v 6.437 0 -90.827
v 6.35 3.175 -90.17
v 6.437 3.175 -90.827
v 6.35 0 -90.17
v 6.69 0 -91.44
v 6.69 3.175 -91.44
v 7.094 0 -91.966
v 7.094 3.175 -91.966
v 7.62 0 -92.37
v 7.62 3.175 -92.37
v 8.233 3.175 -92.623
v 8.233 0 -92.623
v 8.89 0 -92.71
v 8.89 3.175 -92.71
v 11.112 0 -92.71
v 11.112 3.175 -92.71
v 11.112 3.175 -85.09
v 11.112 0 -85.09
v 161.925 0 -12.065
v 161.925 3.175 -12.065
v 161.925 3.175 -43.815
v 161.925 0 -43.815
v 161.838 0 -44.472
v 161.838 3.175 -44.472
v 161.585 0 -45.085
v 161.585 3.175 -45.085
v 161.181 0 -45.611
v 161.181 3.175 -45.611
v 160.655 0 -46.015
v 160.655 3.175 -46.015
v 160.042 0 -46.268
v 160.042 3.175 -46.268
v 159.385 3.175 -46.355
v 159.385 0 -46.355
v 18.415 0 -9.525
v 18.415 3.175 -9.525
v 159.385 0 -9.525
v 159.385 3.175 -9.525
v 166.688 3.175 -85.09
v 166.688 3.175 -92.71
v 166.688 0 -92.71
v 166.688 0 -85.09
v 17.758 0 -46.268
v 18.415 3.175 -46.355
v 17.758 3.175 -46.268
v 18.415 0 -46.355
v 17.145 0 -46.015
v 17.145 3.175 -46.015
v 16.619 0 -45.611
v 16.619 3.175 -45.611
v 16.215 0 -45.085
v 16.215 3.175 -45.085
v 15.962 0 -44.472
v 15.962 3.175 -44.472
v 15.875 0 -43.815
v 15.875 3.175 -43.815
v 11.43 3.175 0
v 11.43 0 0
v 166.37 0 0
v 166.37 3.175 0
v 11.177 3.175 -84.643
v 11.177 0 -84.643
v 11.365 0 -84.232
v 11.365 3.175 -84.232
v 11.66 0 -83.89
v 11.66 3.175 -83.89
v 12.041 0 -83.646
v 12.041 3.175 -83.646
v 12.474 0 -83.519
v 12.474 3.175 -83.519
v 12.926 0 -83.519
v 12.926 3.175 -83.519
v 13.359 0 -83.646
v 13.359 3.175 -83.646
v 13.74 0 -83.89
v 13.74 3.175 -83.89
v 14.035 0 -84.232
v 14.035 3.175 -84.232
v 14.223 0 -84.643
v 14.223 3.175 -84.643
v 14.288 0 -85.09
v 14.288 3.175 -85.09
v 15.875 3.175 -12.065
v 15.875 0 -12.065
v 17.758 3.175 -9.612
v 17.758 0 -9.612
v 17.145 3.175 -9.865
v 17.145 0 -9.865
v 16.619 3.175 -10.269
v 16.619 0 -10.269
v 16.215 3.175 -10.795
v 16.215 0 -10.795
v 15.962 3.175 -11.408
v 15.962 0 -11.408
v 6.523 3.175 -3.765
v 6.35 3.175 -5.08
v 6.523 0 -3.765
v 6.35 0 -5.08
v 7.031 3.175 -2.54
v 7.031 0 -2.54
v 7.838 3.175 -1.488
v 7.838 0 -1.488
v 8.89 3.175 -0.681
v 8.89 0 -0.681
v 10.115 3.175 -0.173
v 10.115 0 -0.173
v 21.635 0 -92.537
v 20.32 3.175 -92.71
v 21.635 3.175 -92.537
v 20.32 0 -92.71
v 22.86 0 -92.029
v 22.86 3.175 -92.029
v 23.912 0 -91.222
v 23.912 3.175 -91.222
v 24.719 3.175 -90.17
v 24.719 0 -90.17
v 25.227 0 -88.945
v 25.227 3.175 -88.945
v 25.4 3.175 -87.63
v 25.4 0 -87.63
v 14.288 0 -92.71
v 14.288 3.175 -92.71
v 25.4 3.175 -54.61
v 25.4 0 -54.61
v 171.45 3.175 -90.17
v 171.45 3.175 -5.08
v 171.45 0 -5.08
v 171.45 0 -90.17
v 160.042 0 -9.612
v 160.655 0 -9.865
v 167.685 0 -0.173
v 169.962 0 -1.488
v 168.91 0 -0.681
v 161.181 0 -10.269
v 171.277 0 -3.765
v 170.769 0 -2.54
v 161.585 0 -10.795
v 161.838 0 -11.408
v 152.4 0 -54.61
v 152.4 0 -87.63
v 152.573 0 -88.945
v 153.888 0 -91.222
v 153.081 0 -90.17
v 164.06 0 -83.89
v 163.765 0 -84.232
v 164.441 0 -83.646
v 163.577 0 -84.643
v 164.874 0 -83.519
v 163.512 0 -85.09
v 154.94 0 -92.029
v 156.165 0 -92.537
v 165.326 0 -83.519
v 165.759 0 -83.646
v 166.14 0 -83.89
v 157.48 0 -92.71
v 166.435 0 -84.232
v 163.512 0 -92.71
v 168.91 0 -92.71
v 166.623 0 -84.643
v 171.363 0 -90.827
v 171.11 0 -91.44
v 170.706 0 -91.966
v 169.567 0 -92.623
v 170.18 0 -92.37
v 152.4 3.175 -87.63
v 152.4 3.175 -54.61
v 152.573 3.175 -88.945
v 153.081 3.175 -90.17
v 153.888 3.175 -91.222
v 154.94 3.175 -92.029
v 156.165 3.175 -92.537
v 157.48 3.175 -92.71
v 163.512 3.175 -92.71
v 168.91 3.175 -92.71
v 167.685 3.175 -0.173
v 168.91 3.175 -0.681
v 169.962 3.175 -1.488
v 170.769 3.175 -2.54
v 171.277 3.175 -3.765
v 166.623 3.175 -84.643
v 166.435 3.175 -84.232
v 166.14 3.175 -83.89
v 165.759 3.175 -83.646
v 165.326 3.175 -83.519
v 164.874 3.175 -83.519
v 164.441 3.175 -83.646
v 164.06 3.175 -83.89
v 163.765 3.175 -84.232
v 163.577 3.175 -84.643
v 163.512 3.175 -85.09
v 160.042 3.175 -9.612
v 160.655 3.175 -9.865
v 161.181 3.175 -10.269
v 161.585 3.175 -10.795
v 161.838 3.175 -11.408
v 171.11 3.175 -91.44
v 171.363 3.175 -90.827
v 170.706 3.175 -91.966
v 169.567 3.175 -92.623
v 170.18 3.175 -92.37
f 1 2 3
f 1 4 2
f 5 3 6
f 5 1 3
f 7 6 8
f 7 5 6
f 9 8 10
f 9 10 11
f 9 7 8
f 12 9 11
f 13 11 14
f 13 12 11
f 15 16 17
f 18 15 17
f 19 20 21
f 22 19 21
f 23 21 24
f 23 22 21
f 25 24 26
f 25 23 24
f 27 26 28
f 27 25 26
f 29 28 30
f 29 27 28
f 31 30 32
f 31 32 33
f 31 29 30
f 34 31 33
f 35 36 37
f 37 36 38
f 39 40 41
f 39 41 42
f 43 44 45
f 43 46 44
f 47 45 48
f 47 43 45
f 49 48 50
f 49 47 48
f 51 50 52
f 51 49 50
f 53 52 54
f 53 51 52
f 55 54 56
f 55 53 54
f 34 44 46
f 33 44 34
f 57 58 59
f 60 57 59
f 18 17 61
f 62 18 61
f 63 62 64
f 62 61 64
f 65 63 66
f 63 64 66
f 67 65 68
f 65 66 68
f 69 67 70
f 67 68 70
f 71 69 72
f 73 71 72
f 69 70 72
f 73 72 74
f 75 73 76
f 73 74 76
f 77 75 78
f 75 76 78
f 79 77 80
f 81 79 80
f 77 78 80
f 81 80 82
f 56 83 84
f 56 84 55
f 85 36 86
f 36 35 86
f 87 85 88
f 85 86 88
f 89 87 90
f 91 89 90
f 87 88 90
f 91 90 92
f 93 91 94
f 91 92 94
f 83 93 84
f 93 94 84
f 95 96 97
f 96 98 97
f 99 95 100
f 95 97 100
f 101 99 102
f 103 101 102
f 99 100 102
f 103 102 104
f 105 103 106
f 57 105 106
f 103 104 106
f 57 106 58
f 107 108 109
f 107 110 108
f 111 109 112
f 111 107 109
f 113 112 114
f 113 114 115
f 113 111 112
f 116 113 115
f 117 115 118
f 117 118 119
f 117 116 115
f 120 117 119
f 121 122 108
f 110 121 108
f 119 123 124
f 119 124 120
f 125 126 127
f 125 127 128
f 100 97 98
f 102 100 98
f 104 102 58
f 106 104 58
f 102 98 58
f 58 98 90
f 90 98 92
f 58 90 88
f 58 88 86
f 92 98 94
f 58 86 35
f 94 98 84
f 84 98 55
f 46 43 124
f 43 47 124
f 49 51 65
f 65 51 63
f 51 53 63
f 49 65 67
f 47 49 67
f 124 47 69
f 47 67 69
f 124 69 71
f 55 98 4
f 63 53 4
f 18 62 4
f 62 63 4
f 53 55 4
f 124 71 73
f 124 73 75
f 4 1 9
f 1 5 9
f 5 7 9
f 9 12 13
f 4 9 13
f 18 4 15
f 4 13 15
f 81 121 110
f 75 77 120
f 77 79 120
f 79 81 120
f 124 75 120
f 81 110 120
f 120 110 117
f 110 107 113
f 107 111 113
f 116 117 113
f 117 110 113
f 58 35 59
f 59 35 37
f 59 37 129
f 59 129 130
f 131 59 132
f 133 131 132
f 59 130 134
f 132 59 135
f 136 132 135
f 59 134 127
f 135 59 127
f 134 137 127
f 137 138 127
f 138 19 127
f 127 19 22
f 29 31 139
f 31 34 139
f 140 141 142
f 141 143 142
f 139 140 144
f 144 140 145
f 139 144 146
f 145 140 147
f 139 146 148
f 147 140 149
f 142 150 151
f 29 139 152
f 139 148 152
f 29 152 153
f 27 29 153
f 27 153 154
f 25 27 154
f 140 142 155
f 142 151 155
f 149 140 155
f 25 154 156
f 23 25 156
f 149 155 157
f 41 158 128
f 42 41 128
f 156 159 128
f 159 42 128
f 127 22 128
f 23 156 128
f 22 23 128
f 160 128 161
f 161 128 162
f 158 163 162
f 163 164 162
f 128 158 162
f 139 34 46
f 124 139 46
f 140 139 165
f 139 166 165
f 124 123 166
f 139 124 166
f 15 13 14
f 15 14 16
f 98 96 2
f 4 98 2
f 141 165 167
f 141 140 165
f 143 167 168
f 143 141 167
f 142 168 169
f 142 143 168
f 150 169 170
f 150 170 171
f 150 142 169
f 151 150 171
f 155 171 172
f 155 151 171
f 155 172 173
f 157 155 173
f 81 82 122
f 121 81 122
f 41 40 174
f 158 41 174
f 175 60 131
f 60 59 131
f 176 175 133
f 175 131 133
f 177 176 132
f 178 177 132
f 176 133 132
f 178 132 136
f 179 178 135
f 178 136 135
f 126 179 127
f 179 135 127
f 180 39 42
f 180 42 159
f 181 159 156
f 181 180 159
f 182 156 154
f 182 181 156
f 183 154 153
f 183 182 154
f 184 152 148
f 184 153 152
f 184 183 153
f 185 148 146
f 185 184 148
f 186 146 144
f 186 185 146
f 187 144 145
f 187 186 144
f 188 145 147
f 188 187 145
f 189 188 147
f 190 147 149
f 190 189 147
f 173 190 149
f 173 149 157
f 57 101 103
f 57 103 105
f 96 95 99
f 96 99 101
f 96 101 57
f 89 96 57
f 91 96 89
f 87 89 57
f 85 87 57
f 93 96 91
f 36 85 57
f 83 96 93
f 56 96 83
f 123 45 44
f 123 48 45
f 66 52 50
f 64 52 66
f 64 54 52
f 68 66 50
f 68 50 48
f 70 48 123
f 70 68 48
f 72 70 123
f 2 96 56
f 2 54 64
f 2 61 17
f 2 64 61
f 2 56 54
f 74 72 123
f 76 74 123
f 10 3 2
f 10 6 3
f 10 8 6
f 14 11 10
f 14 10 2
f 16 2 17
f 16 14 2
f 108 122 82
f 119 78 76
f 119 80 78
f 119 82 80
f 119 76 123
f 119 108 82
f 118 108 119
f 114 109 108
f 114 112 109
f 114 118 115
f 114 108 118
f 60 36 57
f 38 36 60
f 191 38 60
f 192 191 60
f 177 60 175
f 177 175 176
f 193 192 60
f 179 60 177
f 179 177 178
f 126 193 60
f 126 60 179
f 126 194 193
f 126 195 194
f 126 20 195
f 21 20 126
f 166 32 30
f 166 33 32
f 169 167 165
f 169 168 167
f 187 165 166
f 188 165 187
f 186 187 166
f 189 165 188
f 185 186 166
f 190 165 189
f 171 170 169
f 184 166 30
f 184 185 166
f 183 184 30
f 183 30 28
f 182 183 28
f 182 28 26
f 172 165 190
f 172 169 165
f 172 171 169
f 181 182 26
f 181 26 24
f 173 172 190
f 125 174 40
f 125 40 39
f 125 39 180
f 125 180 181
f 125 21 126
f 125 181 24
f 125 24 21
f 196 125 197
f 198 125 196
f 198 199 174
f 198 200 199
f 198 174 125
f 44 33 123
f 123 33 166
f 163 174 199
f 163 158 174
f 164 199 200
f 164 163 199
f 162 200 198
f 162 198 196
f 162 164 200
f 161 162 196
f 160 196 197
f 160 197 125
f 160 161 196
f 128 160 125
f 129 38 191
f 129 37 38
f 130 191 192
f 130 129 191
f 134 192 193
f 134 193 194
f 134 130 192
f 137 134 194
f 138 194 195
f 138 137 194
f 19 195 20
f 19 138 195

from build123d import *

# Parameters (mm, degrees)
SKETCH1_W           = 177.8
SKETCH1_H           = 67.31
BOSS_EXTRUDE1_DEPTH = 3.175
CUT_EXTRUDE2_DEPTH  = 4.175
SKETCH5_W           = 127
SKETCH5_H           = 12.7
CUT_EXTRUDE3_DEPTH  = 4.175
SKETCH7_W           = 25.4
SKETCH7_H           = 38.1
BOSS_EXTRUDE2_DEPTH = 3.175
CUT_EXTRUDE4_DEPTH  = 4.175
FILLET3_R           = 5.08
SKETCH9_W           = 6.35
SKETCH9_H           = 92.71
CUT_EXTRUDE5_DEPTH  = 4.175
FILLET4_R           = 2.54
FILLET5_R           = 5.08
SKETCH10_W          = 146.05
SKETCH10_H          = 36.83
CUT_EXTRUDE6_DEPTH  = 4.175
FILLET6_R           = 2.54


with BuildPart() as part:
    # Sketch1 → Boss-Extrude1 (new body)
    with BuildSketch(Plane(origin=(0, 0, 0), x_dir=(1, 0, 0), z_dir=(0, 1, 0))):
        with Locations((88.9, 33.655)):
            Rectangle(SKETCH1_W, SKETCH1_H)
    extrude(amount=BOSS_EXTRUDE1_DEPTH)

    # Sketch4 → Cut-Extrude2 (cut, through all)
    with BuildSketch(Plane(origin=(0, 3.175, 0), x_dir=(1, 0, 0), z_dir=(0, 1, 0))):
        with BuildLine():
            Line((11.1125, 67.31), (11.1125, 62.23))
            ThreePointArc((11.1125, 62.23), (12.7, 60.6425), (14.2875, 62.23))
            Line((14.2875, 62.23), (14.2875, 67.31))
            Line((14.2875, 67.31), (11.1125, 67.31))
        make_face()
        with BuildLine():
            Line((166.6875, 67.31), (166.6875, 62.23))
            ThreePointArc((166.6875, 62.23), (165.1, 60.6425), (163.5125, 62.23))
            Line((163.5125, 62.23), (163.5125, 67.31))
            Line((163.5125, 67.31), (166.6875, 67.31))
        make_face()
    extrude(amount=-CUT_EXTRUDE2_DEPTH, mode=Mode.SUBTRACT)

    # Sketch5 → Cut-Extrude3 (cut, through all)
    with BuildSketch(Plane(origin=(0, 3.175, 0), x_dir=(1, 0, 0), z_dir=(0, 1, 0))):
        with Locations((88.9, 60.96)):
            Rectangle(SKETCH5_W, SKETCH5_H)
    extrude(amount=-CUT_EXTRUDE3_DEPTH, mode=Mode.SUBTRACT)

    # Sketch7 → Boss-Extrude2 (add)
    with BuildSketch(Plane(origin=(0, 3.175, 0), x_dir=(1, 0, 0), z_dir=(0, 1, 0))):
        with Locations((12.7, 73.66)):
            Rectangle(SKETCH7_W, SKETCH7_H)
        with Locations((165.1, 73.66)):
            Rectangle(SKETCH7_W, SKETCH7_H)
    extrude(amount=-BOSS_EXTRUDE2_DEPTH)

    # Sketch8 → Cut-Extrude4 (cut, through all)
    with BuildSketch(Plane(origin=(0, 3.175, 0), x_dir=(1, 0, 0), z_dir=(0, 1, 0))):
        with BuildLine():
            Line((11.1125, 92.71), (11.1125, 85.09))
            ThreePointArc((11.1125, 85.09), (12.7, 83.5025), (14.2875, 85.09))
            Line((14.2875, 85.09), (14.2875, 92.71))
            Line((14.2875, 92.71), (11.1125, 92.71))
        make_face()
        with BuildLine():
            Line((163.5125, 85.09), (163.5125, 92.71))
            Line((163.5125, 92.71), (166.6875, 92.71))
            Line((166.6875, 92.71), (166.6875, 85.09))
            ThreePointArc((166.6875, 85.09), (165.1, 83.5025), (163.5125, 85.09))
        make_face()
    extrude(amount=-CUT_EXTRUDE4_DEPTH, mode=Mode.SUBTRACT)

    # Fillet3
    fillet3_edges = [part.edges().sort_by_distance(p)[0] for p in [
        (25.4, 1.5875, -92.71),
        (0, 1.5875, -92.71),
        (177.8, 1.5875, -92.71),
        (152.4, 1.5875, -92.71),
    ]]
    fillet(fillet3_edges, radius=FILLET3_R)

    # Sketch9 → Cut-Extrude5 (cut, through all)
    with BuildSketch(Plane(origin=(0, 3.175, 0), x_dir=(1, 0, 0), z_dir=(0, 1, 0))):
        with Locations((3.175, 46.355)):
            Rectangle(SKETCH9_W, SKETCH9_H)
        with Locations((174.625, 46.355)):
            Rectangle(SKETCH9_W, SKETCH9_H)
    extrude(amount=-CUT_EXTRUDE5_DEPTH, mode=Mode.SUBTRACT)

    # Fillet4
    fillet4_edges = [part.edges().sort_by_distance(p)[0] for p in [
        (6.35, 1.5875, -92.71),
        (171.45, 1.5875, -92.71),
    ]]
    fillet(fillet4_edges, radius=FILLET4_R)

    # Fillet5
    fillet5_edges = [part.edges().sort_by_distance(p)[0] for p in [
        (6.35, 1.5875, 0),
        (171.45, 1.5875, 0),
    ]]
    fillet(fillet5_edges, radius=FILLET5_R)

    # Sketch10 → Cut-Extrude6 (cut, through all)
    with BuildSketch(Plane(origin=(0, 3.175, 0), x_dir=(1, 0, 0), z_dir=(0, 1, 0))):
        with Locations((88.9, 27.94)):
            Rectangle(SKETCH10_W, SKETCH10_H)
    extrude(amount=-CUT_EXTRUDE6_DEPTH, mode=Mode.SUBTRACT)

    # Fillet6
    fillet6_edges = [part.edges().sort_by_distance(p)[0] for p in [
        (15.875, 1.5875, -9.525),
        (15.875, 1.5875, -46.355),
        (161.925, 1.5875, -46.355),
        (161.925, 1.5875, -9.525),
    ]]
    fillet(fillet6_edges, radius=FILLET6_R)


solid = part.part
